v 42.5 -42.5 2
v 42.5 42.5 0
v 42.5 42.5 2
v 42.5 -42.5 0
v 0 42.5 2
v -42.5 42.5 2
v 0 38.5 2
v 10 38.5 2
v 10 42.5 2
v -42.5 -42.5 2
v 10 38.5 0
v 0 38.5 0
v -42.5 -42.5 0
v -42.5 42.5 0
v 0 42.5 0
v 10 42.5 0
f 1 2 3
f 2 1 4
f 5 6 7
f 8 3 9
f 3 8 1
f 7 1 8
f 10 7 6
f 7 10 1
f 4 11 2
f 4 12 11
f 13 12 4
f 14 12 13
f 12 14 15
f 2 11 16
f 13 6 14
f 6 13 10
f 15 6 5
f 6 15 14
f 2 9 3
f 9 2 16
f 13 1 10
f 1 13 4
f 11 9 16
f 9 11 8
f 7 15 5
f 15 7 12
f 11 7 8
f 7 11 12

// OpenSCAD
// Sowing template for 90mm Petri dish - flat disc with grid holes and orientation notch.

// Dimensions
DISH_DIA = 90;
DISC_DIA = 85;
THICKNESS = 2;
HOLE_COUNT = 7;
HOLE_DIA = 3;
HOLE_SPACING = 9;
NOTCH_WIDTH = 10;
NOTCH_DEPTH = 4;

$fn = 64;

// Calculate grid offsets to center the grid on the origin
// For 7 holes, indices are 0..6. Center index is 3.
// Offset = (index - 3) * spacing
grid_offset = (HOLE_COUNT - 1) / 2 * HOLE_SPACING;

difference() {
    // Main disc body
    translate([-DISC_DIA / 2, -DISC_DIA / 2, 0])
        cube([DISC_DIA, DISC_DIA, THICKNESS]);

    // Grid of holes
    for (i = [0 : HOLE_COUNT - 1]) {
        x_pos = (i - grid_offset) * HOLE_SPACING;
        
        // Cut hole through the entire thickness
        translate([x_pos, 0, -1])
            cylinder(h = THICKNESS + 2, d = HOLE_DIA);
    }

    // Orientation notch on the +Y side
    // The notch is 4mm deep, measured from the rim inward.
    // Rim Y is DISC_DIA / 2.
    // The cut must start at (Rim Y - Depth) and extend to Rim Y.
    notch_y_start = DISC_DIA / 2 - NOTCH_DEPTH;
    
    // Create the notch shape (a rectangular prism)
    // Position: X=0, Y=notch_y_start, Z=-1 (below bed)
    // Size: X=NOTCH_WIDTH, Y=NOTCH_DEPTH, Z=THICKNESS+2
    // This shape sits inside the disc and cuts out the material up to the rim.
    translate([0, notch_y_start, -1])
        cube([NOTCH_WIDTH, NOTCH_DEPTH, THICKNESS + 2]);
}
